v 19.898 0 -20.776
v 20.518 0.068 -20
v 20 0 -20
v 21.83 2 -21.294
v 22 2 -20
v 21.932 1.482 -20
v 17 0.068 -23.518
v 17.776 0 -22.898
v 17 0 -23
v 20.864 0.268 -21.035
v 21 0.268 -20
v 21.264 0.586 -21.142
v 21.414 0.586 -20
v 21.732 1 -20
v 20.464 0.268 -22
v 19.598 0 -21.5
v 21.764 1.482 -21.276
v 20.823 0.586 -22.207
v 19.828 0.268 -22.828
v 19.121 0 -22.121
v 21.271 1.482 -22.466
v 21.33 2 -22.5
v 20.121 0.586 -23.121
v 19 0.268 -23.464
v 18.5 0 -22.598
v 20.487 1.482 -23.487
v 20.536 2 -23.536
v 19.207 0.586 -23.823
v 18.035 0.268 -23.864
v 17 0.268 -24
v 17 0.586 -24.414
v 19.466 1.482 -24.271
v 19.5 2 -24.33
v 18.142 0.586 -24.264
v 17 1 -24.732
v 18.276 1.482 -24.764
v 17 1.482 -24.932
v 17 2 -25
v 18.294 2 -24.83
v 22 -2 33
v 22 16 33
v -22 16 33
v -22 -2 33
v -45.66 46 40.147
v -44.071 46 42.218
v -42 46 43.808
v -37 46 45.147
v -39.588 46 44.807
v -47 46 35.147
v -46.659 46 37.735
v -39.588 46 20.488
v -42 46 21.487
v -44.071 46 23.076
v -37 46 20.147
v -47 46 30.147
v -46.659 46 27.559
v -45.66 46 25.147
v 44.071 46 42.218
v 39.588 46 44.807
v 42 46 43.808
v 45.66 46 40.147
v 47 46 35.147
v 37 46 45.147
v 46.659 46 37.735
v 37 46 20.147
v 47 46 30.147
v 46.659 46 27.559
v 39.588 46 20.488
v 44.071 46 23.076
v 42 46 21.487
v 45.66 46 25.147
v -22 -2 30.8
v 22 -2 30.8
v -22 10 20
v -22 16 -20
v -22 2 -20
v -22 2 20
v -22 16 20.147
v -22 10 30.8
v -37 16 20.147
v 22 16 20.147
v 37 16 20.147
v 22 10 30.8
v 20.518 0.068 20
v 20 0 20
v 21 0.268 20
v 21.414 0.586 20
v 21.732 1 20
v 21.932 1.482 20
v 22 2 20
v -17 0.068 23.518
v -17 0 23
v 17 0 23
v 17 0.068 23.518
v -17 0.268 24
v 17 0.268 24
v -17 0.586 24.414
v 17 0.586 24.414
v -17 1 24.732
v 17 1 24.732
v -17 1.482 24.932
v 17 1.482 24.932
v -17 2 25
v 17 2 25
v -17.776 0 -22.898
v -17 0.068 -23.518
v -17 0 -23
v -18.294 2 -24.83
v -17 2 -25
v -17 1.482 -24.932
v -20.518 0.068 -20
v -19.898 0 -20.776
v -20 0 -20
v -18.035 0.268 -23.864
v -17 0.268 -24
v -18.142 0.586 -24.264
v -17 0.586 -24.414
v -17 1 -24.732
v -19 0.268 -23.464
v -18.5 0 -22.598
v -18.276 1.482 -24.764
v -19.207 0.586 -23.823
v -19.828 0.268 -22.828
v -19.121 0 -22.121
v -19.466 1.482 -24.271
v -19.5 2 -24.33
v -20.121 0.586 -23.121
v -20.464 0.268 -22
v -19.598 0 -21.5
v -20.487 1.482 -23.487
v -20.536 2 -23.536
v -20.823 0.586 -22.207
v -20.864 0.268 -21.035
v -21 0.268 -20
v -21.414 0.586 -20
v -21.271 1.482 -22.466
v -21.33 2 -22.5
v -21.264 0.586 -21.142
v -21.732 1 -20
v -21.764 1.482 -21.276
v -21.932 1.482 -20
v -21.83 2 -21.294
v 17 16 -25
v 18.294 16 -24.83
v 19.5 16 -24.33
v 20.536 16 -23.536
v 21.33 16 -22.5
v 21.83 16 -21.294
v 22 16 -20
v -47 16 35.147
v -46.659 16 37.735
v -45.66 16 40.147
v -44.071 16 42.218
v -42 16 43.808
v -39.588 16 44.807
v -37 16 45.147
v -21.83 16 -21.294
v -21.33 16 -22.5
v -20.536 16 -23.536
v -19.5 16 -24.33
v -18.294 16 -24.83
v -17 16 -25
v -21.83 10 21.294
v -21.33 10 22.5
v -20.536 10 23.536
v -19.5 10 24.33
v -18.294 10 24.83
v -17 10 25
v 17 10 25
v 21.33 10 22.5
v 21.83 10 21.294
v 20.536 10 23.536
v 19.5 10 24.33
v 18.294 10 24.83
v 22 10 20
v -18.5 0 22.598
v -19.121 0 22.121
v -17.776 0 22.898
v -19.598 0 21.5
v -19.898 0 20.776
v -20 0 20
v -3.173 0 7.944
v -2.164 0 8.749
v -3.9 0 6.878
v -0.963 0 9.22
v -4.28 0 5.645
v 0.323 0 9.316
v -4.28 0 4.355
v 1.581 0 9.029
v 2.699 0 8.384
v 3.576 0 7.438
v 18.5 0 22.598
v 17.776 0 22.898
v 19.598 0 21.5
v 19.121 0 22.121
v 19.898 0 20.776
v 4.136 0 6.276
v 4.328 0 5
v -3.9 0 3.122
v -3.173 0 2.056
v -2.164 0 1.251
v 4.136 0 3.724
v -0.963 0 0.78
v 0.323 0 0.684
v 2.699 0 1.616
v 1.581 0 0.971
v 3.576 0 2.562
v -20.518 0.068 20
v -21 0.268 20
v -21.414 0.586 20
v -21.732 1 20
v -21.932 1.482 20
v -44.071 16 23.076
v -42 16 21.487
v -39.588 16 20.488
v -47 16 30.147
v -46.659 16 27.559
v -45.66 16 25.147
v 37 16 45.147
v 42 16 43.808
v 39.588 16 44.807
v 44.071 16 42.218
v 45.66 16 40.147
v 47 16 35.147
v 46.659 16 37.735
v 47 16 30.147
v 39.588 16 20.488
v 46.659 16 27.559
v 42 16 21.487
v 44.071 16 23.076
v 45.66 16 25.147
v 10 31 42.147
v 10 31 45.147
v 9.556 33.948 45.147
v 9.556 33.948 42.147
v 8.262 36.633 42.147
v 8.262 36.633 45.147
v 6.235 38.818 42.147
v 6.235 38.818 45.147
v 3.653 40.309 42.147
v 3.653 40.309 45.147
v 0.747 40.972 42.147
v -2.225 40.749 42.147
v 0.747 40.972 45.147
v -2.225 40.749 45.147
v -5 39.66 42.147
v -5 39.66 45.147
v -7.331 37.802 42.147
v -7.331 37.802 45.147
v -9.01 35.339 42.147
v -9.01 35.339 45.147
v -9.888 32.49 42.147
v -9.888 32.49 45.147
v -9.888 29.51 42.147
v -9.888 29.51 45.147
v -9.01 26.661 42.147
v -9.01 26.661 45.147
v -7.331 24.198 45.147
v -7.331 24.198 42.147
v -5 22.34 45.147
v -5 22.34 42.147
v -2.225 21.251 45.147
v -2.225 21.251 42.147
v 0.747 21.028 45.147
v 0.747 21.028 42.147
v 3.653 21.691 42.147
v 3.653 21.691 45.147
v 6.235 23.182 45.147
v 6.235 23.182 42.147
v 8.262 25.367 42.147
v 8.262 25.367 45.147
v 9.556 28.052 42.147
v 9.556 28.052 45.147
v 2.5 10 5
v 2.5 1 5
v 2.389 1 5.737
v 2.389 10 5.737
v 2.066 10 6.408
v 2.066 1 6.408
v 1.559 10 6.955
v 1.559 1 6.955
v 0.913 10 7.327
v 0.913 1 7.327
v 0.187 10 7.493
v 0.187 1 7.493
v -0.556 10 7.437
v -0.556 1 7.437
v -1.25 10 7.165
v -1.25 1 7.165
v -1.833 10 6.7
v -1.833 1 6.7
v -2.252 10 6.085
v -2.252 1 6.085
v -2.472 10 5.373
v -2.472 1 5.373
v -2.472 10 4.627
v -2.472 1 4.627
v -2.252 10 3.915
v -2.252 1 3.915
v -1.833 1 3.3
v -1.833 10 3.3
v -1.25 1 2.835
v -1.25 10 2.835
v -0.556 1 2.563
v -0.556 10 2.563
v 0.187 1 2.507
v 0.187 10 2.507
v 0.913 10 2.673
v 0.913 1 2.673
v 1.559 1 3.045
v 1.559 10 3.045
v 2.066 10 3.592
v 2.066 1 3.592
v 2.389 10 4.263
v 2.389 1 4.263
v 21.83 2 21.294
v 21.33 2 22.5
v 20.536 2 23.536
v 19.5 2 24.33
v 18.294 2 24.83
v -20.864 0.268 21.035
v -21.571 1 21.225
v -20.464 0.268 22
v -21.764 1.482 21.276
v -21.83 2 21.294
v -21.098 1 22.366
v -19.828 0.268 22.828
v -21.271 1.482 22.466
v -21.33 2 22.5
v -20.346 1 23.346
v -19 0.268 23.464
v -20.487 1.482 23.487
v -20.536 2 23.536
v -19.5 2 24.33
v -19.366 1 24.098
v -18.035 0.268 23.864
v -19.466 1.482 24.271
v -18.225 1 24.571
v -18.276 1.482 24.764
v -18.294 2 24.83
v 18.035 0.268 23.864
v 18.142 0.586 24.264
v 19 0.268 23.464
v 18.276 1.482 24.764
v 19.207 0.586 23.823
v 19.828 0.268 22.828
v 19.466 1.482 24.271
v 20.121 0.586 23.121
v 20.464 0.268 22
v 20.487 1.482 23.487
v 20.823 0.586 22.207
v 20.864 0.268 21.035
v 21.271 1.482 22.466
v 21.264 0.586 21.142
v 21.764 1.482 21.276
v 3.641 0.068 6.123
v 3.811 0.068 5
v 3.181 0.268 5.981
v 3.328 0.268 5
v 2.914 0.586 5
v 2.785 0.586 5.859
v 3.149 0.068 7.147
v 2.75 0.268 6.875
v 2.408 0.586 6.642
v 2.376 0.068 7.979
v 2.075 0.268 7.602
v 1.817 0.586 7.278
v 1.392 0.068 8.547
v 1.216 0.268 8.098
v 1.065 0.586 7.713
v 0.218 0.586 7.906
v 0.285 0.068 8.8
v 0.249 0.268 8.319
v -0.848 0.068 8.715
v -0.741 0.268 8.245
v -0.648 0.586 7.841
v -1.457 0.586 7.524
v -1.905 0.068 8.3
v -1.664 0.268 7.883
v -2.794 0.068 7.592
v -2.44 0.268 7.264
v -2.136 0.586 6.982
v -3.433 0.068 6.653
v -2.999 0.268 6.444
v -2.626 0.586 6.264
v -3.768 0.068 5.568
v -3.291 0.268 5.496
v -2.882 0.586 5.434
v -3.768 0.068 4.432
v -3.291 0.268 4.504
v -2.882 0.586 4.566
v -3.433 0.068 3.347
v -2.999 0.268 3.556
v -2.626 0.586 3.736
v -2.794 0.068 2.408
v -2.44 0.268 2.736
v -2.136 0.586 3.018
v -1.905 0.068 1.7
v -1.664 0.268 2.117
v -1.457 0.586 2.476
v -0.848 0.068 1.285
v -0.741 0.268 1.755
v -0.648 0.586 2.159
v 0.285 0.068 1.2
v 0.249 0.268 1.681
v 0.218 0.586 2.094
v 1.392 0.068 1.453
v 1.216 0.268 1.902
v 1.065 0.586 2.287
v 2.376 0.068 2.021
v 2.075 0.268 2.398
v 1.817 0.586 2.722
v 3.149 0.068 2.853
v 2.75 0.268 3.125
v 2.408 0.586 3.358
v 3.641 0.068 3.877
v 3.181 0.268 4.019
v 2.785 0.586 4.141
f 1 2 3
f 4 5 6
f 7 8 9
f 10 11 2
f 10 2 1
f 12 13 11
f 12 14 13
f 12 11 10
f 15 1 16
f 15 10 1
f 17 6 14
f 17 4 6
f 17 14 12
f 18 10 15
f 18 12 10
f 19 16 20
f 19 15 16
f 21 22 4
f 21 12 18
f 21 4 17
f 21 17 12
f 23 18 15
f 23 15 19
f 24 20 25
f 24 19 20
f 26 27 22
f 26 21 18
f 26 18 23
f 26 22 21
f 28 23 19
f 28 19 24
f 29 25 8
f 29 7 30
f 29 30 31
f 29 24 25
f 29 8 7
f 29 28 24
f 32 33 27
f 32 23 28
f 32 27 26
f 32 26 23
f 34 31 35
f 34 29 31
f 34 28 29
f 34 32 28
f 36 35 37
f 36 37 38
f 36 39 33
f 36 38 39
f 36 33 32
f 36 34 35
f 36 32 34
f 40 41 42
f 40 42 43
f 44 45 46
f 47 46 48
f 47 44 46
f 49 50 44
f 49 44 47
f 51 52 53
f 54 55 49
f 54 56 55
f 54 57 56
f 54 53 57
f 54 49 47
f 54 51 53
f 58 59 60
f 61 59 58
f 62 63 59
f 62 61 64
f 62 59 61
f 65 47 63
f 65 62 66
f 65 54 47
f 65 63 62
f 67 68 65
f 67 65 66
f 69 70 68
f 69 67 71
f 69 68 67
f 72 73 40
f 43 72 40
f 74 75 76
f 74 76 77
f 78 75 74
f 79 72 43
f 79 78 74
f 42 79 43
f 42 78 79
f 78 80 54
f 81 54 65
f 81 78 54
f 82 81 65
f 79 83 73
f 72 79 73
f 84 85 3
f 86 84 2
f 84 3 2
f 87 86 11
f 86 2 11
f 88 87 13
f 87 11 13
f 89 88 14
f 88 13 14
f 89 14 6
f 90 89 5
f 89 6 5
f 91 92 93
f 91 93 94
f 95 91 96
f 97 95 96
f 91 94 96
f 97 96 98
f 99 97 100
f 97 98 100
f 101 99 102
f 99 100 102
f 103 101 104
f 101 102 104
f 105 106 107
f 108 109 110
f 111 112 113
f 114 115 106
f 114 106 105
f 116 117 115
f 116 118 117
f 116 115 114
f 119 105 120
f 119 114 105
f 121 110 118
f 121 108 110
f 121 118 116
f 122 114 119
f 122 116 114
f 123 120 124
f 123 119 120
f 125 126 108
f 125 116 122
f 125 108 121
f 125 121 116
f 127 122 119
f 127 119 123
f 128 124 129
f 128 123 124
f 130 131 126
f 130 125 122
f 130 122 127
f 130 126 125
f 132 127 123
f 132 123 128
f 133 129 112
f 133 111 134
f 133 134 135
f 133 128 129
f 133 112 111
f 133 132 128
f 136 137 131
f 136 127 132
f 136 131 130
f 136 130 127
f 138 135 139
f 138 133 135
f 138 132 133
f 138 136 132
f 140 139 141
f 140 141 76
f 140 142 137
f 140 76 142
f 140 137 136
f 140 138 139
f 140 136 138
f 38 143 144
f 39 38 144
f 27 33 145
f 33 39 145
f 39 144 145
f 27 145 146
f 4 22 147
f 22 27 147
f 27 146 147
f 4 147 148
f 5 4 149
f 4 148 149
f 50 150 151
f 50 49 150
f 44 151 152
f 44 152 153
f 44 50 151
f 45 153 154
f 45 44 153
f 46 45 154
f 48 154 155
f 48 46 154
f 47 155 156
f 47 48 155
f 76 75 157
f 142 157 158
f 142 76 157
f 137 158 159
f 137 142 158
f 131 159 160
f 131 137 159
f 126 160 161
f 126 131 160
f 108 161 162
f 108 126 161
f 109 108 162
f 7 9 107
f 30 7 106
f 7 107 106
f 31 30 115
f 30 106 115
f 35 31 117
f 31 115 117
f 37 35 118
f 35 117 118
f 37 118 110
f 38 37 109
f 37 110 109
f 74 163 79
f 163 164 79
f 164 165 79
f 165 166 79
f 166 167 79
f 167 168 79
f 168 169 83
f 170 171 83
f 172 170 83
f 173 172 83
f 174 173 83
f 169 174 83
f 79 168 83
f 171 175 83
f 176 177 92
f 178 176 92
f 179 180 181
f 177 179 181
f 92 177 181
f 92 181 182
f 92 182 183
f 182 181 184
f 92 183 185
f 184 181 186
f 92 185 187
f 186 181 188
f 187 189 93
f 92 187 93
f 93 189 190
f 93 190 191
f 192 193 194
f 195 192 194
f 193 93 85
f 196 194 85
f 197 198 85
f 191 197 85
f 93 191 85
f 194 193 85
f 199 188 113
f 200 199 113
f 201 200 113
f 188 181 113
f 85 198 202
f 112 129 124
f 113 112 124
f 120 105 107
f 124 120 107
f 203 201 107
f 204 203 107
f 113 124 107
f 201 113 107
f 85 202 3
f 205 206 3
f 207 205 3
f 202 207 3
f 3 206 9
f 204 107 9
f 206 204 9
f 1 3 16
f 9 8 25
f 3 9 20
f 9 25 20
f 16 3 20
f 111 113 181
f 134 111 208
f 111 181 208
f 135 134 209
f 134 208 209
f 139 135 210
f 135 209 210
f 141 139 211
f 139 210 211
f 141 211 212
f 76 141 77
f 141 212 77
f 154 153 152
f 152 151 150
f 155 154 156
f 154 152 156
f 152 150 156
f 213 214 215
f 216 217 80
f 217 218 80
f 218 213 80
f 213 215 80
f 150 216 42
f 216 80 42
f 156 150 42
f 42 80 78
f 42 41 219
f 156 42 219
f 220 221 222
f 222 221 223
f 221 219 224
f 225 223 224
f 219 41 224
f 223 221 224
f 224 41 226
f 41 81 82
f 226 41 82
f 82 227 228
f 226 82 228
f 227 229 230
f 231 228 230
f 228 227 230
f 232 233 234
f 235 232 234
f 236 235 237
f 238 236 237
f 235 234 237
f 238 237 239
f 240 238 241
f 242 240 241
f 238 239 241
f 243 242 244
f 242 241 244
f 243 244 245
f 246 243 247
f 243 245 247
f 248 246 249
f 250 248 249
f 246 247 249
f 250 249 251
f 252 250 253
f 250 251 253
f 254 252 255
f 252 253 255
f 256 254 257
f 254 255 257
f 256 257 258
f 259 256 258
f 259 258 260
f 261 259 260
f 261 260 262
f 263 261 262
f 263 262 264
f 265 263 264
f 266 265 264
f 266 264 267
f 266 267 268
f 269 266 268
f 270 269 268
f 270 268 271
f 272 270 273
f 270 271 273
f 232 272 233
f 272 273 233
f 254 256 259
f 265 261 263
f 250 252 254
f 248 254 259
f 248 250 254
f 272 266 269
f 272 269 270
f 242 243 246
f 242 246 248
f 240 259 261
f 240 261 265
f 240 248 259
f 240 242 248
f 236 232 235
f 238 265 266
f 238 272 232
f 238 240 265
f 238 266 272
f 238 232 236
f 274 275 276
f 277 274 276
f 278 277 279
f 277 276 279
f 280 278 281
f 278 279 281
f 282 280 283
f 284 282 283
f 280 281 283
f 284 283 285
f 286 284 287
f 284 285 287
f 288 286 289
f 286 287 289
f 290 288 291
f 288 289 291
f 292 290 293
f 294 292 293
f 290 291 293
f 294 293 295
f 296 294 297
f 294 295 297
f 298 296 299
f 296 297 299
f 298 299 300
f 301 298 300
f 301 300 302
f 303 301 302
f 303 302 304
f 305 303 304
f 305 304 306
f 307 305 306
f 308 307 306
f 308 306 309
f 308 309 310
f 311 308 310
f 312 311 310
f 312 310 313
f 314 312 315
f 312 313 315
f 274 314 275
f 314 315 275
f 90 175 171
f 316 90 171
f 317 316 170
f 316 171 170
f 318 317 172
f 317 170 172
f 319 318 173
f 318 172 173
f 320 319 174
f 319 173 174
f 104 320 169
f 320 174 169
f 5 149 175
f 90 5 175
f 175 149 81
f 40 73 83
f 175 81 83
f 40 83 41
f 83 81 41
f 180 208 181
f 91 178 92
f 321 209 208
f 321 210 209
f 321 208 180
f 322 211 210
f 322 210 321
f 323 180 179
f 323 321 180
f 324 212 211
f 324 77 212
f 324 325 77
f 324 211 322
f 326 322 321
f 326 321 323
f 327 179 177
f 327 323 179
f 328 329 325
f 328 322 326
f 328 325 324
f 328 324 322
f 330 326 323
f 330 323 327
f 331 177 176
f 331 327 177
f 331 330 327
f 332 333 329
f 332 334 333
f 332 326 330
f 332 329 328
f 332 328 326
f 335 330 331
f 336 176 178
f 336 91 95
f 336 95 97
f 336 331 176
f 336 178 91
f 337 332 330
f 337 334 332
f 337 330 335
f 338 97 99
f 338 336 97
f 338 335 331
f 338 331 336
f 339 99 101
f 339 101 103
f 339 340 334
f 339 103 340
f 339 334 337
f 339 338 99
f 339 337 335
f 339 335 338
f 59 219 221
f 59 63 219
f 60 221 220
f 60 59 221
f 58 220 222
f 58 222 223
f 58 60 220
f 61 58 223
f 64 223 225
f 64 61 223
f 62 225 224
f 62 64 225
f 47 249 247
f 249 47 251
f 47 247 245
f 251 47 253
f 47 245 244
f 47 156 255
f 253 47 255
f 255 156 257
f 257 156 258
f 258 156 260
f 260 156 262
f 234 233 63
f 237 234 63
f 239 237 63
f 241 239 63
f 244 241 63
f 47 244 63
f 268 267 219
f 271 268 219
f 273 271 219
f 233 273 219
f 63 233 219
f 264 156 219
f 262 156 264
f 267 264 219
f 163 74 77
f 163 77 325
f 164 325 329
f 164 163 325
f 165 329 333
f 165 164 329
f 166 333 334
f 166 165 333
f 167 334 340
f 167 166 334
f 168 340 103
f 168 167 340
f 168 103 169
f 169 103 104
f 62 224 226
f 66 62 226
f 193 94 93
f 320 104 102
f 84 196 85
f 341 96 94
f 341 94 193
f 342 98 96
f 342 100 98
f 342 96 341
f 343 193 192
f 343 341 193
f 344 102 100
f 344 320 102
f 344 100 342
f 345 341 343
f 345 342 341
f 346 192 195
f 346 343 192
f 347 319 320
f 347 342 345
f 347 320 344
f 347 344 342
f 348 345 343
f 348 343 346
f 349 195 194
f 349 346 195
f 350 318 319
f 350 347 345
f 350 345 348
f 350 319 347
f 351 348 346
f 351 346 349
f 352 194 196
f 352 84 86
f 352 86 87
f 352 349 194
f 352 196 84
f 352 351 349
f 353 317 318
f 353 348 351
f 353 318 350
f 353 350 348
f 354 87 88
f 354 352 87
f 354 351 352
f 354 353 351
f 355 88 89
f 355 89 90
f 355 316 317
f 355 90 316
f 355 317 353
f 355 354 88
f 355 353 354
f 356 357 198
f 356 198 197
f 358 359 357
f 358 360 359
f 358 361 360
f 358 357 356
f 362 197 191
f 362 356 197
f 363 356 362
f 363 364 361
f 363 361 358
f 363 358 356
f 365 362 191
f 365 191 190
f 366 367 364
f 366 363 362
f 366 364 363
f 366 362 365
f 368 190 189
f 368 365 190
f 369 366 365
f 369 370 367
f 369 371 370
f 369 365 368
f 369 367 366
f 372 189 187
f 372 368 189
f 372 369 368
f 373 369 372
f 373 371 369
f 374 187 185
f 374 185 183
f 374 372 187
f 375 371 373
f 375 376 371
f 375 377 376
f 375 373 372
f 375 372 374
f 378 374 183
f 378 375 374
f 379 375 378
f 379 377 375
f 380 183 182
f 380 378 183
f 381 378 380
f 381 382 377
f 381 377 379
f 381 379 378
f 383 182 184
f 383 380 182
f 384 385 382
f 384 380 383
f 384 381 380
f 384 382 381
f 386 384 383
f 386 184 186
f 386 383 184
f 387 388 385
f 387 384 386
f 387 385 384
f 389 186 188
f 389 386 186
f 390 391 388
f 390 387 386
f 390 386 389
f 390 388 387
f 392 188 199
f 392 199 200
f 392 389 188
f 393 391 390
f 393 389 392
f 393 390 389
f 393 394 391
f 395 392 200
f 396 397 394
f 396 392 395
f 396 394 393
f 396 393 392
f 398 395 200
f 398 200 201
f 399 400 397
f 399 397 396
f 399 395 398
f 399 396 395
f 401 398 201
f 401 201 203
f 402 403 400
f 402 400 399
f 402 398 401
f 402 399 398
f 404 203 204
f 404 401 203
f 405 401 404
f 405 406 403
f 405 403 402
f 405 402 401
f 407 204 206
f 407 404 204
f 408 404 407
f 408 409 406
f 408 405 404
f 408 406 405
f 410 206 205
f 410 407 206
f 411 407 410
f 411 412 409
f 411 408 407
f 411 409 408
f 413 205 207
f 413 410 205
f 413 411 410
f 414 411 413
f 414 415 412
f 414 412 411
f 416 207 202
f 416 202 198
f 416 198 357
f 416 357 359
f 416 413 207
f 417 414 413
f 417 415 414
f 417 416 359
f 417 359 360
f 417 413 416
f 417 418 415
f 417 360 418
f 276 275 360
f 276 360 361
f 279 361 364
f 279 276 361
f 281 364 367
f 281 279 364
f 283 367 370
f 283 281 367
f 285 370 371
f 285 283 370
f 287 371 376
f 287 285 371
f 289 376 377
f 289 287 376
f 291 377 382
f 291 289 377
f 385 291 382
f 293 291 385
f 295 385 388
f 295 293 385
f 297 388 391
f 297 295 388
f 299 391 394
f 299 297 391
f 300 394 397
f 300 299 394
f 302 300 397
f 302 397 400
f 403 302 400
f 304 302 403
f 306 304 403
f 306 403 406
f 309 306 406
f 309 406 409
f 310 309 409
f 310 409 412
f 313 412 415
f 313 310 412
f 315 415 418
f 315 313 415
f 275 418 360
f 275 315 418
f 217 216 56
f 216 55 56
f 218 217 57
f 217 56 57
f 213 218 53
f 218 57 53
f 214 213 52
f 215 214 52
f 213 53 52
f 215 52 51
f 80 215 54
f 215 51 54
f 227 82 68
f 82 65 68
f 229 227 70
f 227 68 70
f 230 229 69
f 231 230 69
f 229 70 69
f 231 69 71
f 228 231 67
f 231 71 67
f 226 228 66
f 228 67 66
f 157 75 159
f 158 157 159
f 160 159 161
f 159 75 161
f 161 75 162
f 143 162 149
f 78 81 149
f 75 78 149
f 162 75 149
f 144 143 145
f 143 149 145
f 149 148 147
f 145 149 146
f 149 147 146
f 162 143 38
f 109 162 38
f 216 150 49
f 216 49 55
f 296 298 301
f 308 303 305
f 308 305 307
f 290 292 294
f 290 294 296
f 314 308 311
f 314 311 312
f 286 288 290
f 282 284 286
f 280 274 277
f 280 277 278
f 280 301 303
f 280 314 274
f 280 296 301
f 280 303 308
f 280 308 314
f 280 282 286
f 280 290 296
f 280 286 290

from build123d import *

# Parameters (mm, degrees)
SKETCH1_W           = 44
SKETCH1_H           = 50
BOSS_EXTRUDE1_DEPTH = 10
BOSS_EXTRUDE2_DEPTH = 44
FILLET1_R           = 5
SKETCH3_W           = 94
SKETCH3_H           = 25
BOSS_EXTRUDE3_DEPTH = 30
FILLET2_R           = 10
SKETCH4_R           = 10
CUT_EXTRUDE1_DEPTH  = 3
SKETCH5_R           = 2.5
CUT_EXTRUDE2_DEPTH  = 10
CHAMFER1_SIZE       = 1
FILLET3_R           = 2


with BuildPart() as part:
    # Sketch1 → Boss-Extrude1 (new body)
    with BuildSketch(Plane(origin=(0, 0, 0), x_dir=(1, 0, 0), z_dir=(0, 1, 0))):
        Rectangle(SKETCH1_W, SKETCH1_H)
    extrude(amount=BOSS_EXTRUDE1_DEPTH)

    # Sketch2 → Boss-Extrude2 (add)
    with BuildSketch(Plane(origin=(22, 0, 0), x_dir=(0, 0, -1), z_dir=(1, 0, 0))):
        Polygon((25, 10), (-30.8, 10), (-30.8, -2), (-33, -2), (-33, 10), (-33, 16), (25, 16), align=None)
    extrude(amount=-BOSS_EXTRUDE2_DEPTH)

    # Fillet1
    fillet1_edges = [part.edges().sort_by_distance(p)[0] for p in [
        (22, 5, 25),
        (-22, 5, 25),
        (-22, 8, -25),
        (22, 8, -25),
    ]]
    fillet(fillet1_edges, radius=FILLET1_R)

    # Sketch3 → Boss-Extrude3 (add)
    with BuildSketch(Plane(origin=(0, 16, 0), x_dir=(1, 0, 0), z_dir=(0, 1, 0))):
        with Locations((0, -32.64725537)):
            Rectangle(SKETCH3_W, SKETCH3_H)
    extrude(amount=BOSS_EXTRUDE3_DEPTH)

    # Fillet2
    fillet2_edges = [part.edges().sort_by_distance(p)[0] for p in [
        (47, 31, 45.14725537),
        (47, 31, 20.14725537),
        (-47, 31, 20.14725537),
        (-47, 31, 45.14725537),
    ]]
    fillet(fillet2_edges, radius=FILLET2_R)

    # Sketch4 → Cut-Extrude1 (cut)
    with BuildSketch(Plane.XY.offset(45.14725537)):
        with Locations((0, 31)):
            Circle(SKETCH4_R)
    extrude(amount=-CUT_EXTRUDE1_DEPTH, mode=Mode.SUBTRACT)

    # Sketch5 → Cut-Extrude2 (cut)
    with BuildSketch(Plane.XZ):
        with Locations((0, 5)):
            Circle(SKETCH5_R)
    extrude(amount=-CUT_EXTRUDE2_DEPTH, mode=Mode.SUBTRACT)

    # Chamfer1
    chamfer1_edges = [part.edges().sort_by_distance(p)[0] for p in [
        (-2.5, 0, 5),
    ]]
    chamfer(chamfer1_edges, length=CHAMFER1_SIZE)

    # Fillet3
    fillet3_edges = [part.edges().sort_by_distance(p)[0] for p in [
        (-3.5, 0, 5),
        (0, 0, 25),
        (22, 0, 0),
        (-22, 0, 0),
        (0, 0, -25),
        (20.535533906, 0, 23.535533906),
        (20.535533906, 0, -23.535533906),
        (-20.535533906, 0, -23.535533906),
        (-20.535533906, 0, 23.535533906),
    ]]
    fillet(fillet3_edges, radius=FILLET3_R)


solid = part.part
